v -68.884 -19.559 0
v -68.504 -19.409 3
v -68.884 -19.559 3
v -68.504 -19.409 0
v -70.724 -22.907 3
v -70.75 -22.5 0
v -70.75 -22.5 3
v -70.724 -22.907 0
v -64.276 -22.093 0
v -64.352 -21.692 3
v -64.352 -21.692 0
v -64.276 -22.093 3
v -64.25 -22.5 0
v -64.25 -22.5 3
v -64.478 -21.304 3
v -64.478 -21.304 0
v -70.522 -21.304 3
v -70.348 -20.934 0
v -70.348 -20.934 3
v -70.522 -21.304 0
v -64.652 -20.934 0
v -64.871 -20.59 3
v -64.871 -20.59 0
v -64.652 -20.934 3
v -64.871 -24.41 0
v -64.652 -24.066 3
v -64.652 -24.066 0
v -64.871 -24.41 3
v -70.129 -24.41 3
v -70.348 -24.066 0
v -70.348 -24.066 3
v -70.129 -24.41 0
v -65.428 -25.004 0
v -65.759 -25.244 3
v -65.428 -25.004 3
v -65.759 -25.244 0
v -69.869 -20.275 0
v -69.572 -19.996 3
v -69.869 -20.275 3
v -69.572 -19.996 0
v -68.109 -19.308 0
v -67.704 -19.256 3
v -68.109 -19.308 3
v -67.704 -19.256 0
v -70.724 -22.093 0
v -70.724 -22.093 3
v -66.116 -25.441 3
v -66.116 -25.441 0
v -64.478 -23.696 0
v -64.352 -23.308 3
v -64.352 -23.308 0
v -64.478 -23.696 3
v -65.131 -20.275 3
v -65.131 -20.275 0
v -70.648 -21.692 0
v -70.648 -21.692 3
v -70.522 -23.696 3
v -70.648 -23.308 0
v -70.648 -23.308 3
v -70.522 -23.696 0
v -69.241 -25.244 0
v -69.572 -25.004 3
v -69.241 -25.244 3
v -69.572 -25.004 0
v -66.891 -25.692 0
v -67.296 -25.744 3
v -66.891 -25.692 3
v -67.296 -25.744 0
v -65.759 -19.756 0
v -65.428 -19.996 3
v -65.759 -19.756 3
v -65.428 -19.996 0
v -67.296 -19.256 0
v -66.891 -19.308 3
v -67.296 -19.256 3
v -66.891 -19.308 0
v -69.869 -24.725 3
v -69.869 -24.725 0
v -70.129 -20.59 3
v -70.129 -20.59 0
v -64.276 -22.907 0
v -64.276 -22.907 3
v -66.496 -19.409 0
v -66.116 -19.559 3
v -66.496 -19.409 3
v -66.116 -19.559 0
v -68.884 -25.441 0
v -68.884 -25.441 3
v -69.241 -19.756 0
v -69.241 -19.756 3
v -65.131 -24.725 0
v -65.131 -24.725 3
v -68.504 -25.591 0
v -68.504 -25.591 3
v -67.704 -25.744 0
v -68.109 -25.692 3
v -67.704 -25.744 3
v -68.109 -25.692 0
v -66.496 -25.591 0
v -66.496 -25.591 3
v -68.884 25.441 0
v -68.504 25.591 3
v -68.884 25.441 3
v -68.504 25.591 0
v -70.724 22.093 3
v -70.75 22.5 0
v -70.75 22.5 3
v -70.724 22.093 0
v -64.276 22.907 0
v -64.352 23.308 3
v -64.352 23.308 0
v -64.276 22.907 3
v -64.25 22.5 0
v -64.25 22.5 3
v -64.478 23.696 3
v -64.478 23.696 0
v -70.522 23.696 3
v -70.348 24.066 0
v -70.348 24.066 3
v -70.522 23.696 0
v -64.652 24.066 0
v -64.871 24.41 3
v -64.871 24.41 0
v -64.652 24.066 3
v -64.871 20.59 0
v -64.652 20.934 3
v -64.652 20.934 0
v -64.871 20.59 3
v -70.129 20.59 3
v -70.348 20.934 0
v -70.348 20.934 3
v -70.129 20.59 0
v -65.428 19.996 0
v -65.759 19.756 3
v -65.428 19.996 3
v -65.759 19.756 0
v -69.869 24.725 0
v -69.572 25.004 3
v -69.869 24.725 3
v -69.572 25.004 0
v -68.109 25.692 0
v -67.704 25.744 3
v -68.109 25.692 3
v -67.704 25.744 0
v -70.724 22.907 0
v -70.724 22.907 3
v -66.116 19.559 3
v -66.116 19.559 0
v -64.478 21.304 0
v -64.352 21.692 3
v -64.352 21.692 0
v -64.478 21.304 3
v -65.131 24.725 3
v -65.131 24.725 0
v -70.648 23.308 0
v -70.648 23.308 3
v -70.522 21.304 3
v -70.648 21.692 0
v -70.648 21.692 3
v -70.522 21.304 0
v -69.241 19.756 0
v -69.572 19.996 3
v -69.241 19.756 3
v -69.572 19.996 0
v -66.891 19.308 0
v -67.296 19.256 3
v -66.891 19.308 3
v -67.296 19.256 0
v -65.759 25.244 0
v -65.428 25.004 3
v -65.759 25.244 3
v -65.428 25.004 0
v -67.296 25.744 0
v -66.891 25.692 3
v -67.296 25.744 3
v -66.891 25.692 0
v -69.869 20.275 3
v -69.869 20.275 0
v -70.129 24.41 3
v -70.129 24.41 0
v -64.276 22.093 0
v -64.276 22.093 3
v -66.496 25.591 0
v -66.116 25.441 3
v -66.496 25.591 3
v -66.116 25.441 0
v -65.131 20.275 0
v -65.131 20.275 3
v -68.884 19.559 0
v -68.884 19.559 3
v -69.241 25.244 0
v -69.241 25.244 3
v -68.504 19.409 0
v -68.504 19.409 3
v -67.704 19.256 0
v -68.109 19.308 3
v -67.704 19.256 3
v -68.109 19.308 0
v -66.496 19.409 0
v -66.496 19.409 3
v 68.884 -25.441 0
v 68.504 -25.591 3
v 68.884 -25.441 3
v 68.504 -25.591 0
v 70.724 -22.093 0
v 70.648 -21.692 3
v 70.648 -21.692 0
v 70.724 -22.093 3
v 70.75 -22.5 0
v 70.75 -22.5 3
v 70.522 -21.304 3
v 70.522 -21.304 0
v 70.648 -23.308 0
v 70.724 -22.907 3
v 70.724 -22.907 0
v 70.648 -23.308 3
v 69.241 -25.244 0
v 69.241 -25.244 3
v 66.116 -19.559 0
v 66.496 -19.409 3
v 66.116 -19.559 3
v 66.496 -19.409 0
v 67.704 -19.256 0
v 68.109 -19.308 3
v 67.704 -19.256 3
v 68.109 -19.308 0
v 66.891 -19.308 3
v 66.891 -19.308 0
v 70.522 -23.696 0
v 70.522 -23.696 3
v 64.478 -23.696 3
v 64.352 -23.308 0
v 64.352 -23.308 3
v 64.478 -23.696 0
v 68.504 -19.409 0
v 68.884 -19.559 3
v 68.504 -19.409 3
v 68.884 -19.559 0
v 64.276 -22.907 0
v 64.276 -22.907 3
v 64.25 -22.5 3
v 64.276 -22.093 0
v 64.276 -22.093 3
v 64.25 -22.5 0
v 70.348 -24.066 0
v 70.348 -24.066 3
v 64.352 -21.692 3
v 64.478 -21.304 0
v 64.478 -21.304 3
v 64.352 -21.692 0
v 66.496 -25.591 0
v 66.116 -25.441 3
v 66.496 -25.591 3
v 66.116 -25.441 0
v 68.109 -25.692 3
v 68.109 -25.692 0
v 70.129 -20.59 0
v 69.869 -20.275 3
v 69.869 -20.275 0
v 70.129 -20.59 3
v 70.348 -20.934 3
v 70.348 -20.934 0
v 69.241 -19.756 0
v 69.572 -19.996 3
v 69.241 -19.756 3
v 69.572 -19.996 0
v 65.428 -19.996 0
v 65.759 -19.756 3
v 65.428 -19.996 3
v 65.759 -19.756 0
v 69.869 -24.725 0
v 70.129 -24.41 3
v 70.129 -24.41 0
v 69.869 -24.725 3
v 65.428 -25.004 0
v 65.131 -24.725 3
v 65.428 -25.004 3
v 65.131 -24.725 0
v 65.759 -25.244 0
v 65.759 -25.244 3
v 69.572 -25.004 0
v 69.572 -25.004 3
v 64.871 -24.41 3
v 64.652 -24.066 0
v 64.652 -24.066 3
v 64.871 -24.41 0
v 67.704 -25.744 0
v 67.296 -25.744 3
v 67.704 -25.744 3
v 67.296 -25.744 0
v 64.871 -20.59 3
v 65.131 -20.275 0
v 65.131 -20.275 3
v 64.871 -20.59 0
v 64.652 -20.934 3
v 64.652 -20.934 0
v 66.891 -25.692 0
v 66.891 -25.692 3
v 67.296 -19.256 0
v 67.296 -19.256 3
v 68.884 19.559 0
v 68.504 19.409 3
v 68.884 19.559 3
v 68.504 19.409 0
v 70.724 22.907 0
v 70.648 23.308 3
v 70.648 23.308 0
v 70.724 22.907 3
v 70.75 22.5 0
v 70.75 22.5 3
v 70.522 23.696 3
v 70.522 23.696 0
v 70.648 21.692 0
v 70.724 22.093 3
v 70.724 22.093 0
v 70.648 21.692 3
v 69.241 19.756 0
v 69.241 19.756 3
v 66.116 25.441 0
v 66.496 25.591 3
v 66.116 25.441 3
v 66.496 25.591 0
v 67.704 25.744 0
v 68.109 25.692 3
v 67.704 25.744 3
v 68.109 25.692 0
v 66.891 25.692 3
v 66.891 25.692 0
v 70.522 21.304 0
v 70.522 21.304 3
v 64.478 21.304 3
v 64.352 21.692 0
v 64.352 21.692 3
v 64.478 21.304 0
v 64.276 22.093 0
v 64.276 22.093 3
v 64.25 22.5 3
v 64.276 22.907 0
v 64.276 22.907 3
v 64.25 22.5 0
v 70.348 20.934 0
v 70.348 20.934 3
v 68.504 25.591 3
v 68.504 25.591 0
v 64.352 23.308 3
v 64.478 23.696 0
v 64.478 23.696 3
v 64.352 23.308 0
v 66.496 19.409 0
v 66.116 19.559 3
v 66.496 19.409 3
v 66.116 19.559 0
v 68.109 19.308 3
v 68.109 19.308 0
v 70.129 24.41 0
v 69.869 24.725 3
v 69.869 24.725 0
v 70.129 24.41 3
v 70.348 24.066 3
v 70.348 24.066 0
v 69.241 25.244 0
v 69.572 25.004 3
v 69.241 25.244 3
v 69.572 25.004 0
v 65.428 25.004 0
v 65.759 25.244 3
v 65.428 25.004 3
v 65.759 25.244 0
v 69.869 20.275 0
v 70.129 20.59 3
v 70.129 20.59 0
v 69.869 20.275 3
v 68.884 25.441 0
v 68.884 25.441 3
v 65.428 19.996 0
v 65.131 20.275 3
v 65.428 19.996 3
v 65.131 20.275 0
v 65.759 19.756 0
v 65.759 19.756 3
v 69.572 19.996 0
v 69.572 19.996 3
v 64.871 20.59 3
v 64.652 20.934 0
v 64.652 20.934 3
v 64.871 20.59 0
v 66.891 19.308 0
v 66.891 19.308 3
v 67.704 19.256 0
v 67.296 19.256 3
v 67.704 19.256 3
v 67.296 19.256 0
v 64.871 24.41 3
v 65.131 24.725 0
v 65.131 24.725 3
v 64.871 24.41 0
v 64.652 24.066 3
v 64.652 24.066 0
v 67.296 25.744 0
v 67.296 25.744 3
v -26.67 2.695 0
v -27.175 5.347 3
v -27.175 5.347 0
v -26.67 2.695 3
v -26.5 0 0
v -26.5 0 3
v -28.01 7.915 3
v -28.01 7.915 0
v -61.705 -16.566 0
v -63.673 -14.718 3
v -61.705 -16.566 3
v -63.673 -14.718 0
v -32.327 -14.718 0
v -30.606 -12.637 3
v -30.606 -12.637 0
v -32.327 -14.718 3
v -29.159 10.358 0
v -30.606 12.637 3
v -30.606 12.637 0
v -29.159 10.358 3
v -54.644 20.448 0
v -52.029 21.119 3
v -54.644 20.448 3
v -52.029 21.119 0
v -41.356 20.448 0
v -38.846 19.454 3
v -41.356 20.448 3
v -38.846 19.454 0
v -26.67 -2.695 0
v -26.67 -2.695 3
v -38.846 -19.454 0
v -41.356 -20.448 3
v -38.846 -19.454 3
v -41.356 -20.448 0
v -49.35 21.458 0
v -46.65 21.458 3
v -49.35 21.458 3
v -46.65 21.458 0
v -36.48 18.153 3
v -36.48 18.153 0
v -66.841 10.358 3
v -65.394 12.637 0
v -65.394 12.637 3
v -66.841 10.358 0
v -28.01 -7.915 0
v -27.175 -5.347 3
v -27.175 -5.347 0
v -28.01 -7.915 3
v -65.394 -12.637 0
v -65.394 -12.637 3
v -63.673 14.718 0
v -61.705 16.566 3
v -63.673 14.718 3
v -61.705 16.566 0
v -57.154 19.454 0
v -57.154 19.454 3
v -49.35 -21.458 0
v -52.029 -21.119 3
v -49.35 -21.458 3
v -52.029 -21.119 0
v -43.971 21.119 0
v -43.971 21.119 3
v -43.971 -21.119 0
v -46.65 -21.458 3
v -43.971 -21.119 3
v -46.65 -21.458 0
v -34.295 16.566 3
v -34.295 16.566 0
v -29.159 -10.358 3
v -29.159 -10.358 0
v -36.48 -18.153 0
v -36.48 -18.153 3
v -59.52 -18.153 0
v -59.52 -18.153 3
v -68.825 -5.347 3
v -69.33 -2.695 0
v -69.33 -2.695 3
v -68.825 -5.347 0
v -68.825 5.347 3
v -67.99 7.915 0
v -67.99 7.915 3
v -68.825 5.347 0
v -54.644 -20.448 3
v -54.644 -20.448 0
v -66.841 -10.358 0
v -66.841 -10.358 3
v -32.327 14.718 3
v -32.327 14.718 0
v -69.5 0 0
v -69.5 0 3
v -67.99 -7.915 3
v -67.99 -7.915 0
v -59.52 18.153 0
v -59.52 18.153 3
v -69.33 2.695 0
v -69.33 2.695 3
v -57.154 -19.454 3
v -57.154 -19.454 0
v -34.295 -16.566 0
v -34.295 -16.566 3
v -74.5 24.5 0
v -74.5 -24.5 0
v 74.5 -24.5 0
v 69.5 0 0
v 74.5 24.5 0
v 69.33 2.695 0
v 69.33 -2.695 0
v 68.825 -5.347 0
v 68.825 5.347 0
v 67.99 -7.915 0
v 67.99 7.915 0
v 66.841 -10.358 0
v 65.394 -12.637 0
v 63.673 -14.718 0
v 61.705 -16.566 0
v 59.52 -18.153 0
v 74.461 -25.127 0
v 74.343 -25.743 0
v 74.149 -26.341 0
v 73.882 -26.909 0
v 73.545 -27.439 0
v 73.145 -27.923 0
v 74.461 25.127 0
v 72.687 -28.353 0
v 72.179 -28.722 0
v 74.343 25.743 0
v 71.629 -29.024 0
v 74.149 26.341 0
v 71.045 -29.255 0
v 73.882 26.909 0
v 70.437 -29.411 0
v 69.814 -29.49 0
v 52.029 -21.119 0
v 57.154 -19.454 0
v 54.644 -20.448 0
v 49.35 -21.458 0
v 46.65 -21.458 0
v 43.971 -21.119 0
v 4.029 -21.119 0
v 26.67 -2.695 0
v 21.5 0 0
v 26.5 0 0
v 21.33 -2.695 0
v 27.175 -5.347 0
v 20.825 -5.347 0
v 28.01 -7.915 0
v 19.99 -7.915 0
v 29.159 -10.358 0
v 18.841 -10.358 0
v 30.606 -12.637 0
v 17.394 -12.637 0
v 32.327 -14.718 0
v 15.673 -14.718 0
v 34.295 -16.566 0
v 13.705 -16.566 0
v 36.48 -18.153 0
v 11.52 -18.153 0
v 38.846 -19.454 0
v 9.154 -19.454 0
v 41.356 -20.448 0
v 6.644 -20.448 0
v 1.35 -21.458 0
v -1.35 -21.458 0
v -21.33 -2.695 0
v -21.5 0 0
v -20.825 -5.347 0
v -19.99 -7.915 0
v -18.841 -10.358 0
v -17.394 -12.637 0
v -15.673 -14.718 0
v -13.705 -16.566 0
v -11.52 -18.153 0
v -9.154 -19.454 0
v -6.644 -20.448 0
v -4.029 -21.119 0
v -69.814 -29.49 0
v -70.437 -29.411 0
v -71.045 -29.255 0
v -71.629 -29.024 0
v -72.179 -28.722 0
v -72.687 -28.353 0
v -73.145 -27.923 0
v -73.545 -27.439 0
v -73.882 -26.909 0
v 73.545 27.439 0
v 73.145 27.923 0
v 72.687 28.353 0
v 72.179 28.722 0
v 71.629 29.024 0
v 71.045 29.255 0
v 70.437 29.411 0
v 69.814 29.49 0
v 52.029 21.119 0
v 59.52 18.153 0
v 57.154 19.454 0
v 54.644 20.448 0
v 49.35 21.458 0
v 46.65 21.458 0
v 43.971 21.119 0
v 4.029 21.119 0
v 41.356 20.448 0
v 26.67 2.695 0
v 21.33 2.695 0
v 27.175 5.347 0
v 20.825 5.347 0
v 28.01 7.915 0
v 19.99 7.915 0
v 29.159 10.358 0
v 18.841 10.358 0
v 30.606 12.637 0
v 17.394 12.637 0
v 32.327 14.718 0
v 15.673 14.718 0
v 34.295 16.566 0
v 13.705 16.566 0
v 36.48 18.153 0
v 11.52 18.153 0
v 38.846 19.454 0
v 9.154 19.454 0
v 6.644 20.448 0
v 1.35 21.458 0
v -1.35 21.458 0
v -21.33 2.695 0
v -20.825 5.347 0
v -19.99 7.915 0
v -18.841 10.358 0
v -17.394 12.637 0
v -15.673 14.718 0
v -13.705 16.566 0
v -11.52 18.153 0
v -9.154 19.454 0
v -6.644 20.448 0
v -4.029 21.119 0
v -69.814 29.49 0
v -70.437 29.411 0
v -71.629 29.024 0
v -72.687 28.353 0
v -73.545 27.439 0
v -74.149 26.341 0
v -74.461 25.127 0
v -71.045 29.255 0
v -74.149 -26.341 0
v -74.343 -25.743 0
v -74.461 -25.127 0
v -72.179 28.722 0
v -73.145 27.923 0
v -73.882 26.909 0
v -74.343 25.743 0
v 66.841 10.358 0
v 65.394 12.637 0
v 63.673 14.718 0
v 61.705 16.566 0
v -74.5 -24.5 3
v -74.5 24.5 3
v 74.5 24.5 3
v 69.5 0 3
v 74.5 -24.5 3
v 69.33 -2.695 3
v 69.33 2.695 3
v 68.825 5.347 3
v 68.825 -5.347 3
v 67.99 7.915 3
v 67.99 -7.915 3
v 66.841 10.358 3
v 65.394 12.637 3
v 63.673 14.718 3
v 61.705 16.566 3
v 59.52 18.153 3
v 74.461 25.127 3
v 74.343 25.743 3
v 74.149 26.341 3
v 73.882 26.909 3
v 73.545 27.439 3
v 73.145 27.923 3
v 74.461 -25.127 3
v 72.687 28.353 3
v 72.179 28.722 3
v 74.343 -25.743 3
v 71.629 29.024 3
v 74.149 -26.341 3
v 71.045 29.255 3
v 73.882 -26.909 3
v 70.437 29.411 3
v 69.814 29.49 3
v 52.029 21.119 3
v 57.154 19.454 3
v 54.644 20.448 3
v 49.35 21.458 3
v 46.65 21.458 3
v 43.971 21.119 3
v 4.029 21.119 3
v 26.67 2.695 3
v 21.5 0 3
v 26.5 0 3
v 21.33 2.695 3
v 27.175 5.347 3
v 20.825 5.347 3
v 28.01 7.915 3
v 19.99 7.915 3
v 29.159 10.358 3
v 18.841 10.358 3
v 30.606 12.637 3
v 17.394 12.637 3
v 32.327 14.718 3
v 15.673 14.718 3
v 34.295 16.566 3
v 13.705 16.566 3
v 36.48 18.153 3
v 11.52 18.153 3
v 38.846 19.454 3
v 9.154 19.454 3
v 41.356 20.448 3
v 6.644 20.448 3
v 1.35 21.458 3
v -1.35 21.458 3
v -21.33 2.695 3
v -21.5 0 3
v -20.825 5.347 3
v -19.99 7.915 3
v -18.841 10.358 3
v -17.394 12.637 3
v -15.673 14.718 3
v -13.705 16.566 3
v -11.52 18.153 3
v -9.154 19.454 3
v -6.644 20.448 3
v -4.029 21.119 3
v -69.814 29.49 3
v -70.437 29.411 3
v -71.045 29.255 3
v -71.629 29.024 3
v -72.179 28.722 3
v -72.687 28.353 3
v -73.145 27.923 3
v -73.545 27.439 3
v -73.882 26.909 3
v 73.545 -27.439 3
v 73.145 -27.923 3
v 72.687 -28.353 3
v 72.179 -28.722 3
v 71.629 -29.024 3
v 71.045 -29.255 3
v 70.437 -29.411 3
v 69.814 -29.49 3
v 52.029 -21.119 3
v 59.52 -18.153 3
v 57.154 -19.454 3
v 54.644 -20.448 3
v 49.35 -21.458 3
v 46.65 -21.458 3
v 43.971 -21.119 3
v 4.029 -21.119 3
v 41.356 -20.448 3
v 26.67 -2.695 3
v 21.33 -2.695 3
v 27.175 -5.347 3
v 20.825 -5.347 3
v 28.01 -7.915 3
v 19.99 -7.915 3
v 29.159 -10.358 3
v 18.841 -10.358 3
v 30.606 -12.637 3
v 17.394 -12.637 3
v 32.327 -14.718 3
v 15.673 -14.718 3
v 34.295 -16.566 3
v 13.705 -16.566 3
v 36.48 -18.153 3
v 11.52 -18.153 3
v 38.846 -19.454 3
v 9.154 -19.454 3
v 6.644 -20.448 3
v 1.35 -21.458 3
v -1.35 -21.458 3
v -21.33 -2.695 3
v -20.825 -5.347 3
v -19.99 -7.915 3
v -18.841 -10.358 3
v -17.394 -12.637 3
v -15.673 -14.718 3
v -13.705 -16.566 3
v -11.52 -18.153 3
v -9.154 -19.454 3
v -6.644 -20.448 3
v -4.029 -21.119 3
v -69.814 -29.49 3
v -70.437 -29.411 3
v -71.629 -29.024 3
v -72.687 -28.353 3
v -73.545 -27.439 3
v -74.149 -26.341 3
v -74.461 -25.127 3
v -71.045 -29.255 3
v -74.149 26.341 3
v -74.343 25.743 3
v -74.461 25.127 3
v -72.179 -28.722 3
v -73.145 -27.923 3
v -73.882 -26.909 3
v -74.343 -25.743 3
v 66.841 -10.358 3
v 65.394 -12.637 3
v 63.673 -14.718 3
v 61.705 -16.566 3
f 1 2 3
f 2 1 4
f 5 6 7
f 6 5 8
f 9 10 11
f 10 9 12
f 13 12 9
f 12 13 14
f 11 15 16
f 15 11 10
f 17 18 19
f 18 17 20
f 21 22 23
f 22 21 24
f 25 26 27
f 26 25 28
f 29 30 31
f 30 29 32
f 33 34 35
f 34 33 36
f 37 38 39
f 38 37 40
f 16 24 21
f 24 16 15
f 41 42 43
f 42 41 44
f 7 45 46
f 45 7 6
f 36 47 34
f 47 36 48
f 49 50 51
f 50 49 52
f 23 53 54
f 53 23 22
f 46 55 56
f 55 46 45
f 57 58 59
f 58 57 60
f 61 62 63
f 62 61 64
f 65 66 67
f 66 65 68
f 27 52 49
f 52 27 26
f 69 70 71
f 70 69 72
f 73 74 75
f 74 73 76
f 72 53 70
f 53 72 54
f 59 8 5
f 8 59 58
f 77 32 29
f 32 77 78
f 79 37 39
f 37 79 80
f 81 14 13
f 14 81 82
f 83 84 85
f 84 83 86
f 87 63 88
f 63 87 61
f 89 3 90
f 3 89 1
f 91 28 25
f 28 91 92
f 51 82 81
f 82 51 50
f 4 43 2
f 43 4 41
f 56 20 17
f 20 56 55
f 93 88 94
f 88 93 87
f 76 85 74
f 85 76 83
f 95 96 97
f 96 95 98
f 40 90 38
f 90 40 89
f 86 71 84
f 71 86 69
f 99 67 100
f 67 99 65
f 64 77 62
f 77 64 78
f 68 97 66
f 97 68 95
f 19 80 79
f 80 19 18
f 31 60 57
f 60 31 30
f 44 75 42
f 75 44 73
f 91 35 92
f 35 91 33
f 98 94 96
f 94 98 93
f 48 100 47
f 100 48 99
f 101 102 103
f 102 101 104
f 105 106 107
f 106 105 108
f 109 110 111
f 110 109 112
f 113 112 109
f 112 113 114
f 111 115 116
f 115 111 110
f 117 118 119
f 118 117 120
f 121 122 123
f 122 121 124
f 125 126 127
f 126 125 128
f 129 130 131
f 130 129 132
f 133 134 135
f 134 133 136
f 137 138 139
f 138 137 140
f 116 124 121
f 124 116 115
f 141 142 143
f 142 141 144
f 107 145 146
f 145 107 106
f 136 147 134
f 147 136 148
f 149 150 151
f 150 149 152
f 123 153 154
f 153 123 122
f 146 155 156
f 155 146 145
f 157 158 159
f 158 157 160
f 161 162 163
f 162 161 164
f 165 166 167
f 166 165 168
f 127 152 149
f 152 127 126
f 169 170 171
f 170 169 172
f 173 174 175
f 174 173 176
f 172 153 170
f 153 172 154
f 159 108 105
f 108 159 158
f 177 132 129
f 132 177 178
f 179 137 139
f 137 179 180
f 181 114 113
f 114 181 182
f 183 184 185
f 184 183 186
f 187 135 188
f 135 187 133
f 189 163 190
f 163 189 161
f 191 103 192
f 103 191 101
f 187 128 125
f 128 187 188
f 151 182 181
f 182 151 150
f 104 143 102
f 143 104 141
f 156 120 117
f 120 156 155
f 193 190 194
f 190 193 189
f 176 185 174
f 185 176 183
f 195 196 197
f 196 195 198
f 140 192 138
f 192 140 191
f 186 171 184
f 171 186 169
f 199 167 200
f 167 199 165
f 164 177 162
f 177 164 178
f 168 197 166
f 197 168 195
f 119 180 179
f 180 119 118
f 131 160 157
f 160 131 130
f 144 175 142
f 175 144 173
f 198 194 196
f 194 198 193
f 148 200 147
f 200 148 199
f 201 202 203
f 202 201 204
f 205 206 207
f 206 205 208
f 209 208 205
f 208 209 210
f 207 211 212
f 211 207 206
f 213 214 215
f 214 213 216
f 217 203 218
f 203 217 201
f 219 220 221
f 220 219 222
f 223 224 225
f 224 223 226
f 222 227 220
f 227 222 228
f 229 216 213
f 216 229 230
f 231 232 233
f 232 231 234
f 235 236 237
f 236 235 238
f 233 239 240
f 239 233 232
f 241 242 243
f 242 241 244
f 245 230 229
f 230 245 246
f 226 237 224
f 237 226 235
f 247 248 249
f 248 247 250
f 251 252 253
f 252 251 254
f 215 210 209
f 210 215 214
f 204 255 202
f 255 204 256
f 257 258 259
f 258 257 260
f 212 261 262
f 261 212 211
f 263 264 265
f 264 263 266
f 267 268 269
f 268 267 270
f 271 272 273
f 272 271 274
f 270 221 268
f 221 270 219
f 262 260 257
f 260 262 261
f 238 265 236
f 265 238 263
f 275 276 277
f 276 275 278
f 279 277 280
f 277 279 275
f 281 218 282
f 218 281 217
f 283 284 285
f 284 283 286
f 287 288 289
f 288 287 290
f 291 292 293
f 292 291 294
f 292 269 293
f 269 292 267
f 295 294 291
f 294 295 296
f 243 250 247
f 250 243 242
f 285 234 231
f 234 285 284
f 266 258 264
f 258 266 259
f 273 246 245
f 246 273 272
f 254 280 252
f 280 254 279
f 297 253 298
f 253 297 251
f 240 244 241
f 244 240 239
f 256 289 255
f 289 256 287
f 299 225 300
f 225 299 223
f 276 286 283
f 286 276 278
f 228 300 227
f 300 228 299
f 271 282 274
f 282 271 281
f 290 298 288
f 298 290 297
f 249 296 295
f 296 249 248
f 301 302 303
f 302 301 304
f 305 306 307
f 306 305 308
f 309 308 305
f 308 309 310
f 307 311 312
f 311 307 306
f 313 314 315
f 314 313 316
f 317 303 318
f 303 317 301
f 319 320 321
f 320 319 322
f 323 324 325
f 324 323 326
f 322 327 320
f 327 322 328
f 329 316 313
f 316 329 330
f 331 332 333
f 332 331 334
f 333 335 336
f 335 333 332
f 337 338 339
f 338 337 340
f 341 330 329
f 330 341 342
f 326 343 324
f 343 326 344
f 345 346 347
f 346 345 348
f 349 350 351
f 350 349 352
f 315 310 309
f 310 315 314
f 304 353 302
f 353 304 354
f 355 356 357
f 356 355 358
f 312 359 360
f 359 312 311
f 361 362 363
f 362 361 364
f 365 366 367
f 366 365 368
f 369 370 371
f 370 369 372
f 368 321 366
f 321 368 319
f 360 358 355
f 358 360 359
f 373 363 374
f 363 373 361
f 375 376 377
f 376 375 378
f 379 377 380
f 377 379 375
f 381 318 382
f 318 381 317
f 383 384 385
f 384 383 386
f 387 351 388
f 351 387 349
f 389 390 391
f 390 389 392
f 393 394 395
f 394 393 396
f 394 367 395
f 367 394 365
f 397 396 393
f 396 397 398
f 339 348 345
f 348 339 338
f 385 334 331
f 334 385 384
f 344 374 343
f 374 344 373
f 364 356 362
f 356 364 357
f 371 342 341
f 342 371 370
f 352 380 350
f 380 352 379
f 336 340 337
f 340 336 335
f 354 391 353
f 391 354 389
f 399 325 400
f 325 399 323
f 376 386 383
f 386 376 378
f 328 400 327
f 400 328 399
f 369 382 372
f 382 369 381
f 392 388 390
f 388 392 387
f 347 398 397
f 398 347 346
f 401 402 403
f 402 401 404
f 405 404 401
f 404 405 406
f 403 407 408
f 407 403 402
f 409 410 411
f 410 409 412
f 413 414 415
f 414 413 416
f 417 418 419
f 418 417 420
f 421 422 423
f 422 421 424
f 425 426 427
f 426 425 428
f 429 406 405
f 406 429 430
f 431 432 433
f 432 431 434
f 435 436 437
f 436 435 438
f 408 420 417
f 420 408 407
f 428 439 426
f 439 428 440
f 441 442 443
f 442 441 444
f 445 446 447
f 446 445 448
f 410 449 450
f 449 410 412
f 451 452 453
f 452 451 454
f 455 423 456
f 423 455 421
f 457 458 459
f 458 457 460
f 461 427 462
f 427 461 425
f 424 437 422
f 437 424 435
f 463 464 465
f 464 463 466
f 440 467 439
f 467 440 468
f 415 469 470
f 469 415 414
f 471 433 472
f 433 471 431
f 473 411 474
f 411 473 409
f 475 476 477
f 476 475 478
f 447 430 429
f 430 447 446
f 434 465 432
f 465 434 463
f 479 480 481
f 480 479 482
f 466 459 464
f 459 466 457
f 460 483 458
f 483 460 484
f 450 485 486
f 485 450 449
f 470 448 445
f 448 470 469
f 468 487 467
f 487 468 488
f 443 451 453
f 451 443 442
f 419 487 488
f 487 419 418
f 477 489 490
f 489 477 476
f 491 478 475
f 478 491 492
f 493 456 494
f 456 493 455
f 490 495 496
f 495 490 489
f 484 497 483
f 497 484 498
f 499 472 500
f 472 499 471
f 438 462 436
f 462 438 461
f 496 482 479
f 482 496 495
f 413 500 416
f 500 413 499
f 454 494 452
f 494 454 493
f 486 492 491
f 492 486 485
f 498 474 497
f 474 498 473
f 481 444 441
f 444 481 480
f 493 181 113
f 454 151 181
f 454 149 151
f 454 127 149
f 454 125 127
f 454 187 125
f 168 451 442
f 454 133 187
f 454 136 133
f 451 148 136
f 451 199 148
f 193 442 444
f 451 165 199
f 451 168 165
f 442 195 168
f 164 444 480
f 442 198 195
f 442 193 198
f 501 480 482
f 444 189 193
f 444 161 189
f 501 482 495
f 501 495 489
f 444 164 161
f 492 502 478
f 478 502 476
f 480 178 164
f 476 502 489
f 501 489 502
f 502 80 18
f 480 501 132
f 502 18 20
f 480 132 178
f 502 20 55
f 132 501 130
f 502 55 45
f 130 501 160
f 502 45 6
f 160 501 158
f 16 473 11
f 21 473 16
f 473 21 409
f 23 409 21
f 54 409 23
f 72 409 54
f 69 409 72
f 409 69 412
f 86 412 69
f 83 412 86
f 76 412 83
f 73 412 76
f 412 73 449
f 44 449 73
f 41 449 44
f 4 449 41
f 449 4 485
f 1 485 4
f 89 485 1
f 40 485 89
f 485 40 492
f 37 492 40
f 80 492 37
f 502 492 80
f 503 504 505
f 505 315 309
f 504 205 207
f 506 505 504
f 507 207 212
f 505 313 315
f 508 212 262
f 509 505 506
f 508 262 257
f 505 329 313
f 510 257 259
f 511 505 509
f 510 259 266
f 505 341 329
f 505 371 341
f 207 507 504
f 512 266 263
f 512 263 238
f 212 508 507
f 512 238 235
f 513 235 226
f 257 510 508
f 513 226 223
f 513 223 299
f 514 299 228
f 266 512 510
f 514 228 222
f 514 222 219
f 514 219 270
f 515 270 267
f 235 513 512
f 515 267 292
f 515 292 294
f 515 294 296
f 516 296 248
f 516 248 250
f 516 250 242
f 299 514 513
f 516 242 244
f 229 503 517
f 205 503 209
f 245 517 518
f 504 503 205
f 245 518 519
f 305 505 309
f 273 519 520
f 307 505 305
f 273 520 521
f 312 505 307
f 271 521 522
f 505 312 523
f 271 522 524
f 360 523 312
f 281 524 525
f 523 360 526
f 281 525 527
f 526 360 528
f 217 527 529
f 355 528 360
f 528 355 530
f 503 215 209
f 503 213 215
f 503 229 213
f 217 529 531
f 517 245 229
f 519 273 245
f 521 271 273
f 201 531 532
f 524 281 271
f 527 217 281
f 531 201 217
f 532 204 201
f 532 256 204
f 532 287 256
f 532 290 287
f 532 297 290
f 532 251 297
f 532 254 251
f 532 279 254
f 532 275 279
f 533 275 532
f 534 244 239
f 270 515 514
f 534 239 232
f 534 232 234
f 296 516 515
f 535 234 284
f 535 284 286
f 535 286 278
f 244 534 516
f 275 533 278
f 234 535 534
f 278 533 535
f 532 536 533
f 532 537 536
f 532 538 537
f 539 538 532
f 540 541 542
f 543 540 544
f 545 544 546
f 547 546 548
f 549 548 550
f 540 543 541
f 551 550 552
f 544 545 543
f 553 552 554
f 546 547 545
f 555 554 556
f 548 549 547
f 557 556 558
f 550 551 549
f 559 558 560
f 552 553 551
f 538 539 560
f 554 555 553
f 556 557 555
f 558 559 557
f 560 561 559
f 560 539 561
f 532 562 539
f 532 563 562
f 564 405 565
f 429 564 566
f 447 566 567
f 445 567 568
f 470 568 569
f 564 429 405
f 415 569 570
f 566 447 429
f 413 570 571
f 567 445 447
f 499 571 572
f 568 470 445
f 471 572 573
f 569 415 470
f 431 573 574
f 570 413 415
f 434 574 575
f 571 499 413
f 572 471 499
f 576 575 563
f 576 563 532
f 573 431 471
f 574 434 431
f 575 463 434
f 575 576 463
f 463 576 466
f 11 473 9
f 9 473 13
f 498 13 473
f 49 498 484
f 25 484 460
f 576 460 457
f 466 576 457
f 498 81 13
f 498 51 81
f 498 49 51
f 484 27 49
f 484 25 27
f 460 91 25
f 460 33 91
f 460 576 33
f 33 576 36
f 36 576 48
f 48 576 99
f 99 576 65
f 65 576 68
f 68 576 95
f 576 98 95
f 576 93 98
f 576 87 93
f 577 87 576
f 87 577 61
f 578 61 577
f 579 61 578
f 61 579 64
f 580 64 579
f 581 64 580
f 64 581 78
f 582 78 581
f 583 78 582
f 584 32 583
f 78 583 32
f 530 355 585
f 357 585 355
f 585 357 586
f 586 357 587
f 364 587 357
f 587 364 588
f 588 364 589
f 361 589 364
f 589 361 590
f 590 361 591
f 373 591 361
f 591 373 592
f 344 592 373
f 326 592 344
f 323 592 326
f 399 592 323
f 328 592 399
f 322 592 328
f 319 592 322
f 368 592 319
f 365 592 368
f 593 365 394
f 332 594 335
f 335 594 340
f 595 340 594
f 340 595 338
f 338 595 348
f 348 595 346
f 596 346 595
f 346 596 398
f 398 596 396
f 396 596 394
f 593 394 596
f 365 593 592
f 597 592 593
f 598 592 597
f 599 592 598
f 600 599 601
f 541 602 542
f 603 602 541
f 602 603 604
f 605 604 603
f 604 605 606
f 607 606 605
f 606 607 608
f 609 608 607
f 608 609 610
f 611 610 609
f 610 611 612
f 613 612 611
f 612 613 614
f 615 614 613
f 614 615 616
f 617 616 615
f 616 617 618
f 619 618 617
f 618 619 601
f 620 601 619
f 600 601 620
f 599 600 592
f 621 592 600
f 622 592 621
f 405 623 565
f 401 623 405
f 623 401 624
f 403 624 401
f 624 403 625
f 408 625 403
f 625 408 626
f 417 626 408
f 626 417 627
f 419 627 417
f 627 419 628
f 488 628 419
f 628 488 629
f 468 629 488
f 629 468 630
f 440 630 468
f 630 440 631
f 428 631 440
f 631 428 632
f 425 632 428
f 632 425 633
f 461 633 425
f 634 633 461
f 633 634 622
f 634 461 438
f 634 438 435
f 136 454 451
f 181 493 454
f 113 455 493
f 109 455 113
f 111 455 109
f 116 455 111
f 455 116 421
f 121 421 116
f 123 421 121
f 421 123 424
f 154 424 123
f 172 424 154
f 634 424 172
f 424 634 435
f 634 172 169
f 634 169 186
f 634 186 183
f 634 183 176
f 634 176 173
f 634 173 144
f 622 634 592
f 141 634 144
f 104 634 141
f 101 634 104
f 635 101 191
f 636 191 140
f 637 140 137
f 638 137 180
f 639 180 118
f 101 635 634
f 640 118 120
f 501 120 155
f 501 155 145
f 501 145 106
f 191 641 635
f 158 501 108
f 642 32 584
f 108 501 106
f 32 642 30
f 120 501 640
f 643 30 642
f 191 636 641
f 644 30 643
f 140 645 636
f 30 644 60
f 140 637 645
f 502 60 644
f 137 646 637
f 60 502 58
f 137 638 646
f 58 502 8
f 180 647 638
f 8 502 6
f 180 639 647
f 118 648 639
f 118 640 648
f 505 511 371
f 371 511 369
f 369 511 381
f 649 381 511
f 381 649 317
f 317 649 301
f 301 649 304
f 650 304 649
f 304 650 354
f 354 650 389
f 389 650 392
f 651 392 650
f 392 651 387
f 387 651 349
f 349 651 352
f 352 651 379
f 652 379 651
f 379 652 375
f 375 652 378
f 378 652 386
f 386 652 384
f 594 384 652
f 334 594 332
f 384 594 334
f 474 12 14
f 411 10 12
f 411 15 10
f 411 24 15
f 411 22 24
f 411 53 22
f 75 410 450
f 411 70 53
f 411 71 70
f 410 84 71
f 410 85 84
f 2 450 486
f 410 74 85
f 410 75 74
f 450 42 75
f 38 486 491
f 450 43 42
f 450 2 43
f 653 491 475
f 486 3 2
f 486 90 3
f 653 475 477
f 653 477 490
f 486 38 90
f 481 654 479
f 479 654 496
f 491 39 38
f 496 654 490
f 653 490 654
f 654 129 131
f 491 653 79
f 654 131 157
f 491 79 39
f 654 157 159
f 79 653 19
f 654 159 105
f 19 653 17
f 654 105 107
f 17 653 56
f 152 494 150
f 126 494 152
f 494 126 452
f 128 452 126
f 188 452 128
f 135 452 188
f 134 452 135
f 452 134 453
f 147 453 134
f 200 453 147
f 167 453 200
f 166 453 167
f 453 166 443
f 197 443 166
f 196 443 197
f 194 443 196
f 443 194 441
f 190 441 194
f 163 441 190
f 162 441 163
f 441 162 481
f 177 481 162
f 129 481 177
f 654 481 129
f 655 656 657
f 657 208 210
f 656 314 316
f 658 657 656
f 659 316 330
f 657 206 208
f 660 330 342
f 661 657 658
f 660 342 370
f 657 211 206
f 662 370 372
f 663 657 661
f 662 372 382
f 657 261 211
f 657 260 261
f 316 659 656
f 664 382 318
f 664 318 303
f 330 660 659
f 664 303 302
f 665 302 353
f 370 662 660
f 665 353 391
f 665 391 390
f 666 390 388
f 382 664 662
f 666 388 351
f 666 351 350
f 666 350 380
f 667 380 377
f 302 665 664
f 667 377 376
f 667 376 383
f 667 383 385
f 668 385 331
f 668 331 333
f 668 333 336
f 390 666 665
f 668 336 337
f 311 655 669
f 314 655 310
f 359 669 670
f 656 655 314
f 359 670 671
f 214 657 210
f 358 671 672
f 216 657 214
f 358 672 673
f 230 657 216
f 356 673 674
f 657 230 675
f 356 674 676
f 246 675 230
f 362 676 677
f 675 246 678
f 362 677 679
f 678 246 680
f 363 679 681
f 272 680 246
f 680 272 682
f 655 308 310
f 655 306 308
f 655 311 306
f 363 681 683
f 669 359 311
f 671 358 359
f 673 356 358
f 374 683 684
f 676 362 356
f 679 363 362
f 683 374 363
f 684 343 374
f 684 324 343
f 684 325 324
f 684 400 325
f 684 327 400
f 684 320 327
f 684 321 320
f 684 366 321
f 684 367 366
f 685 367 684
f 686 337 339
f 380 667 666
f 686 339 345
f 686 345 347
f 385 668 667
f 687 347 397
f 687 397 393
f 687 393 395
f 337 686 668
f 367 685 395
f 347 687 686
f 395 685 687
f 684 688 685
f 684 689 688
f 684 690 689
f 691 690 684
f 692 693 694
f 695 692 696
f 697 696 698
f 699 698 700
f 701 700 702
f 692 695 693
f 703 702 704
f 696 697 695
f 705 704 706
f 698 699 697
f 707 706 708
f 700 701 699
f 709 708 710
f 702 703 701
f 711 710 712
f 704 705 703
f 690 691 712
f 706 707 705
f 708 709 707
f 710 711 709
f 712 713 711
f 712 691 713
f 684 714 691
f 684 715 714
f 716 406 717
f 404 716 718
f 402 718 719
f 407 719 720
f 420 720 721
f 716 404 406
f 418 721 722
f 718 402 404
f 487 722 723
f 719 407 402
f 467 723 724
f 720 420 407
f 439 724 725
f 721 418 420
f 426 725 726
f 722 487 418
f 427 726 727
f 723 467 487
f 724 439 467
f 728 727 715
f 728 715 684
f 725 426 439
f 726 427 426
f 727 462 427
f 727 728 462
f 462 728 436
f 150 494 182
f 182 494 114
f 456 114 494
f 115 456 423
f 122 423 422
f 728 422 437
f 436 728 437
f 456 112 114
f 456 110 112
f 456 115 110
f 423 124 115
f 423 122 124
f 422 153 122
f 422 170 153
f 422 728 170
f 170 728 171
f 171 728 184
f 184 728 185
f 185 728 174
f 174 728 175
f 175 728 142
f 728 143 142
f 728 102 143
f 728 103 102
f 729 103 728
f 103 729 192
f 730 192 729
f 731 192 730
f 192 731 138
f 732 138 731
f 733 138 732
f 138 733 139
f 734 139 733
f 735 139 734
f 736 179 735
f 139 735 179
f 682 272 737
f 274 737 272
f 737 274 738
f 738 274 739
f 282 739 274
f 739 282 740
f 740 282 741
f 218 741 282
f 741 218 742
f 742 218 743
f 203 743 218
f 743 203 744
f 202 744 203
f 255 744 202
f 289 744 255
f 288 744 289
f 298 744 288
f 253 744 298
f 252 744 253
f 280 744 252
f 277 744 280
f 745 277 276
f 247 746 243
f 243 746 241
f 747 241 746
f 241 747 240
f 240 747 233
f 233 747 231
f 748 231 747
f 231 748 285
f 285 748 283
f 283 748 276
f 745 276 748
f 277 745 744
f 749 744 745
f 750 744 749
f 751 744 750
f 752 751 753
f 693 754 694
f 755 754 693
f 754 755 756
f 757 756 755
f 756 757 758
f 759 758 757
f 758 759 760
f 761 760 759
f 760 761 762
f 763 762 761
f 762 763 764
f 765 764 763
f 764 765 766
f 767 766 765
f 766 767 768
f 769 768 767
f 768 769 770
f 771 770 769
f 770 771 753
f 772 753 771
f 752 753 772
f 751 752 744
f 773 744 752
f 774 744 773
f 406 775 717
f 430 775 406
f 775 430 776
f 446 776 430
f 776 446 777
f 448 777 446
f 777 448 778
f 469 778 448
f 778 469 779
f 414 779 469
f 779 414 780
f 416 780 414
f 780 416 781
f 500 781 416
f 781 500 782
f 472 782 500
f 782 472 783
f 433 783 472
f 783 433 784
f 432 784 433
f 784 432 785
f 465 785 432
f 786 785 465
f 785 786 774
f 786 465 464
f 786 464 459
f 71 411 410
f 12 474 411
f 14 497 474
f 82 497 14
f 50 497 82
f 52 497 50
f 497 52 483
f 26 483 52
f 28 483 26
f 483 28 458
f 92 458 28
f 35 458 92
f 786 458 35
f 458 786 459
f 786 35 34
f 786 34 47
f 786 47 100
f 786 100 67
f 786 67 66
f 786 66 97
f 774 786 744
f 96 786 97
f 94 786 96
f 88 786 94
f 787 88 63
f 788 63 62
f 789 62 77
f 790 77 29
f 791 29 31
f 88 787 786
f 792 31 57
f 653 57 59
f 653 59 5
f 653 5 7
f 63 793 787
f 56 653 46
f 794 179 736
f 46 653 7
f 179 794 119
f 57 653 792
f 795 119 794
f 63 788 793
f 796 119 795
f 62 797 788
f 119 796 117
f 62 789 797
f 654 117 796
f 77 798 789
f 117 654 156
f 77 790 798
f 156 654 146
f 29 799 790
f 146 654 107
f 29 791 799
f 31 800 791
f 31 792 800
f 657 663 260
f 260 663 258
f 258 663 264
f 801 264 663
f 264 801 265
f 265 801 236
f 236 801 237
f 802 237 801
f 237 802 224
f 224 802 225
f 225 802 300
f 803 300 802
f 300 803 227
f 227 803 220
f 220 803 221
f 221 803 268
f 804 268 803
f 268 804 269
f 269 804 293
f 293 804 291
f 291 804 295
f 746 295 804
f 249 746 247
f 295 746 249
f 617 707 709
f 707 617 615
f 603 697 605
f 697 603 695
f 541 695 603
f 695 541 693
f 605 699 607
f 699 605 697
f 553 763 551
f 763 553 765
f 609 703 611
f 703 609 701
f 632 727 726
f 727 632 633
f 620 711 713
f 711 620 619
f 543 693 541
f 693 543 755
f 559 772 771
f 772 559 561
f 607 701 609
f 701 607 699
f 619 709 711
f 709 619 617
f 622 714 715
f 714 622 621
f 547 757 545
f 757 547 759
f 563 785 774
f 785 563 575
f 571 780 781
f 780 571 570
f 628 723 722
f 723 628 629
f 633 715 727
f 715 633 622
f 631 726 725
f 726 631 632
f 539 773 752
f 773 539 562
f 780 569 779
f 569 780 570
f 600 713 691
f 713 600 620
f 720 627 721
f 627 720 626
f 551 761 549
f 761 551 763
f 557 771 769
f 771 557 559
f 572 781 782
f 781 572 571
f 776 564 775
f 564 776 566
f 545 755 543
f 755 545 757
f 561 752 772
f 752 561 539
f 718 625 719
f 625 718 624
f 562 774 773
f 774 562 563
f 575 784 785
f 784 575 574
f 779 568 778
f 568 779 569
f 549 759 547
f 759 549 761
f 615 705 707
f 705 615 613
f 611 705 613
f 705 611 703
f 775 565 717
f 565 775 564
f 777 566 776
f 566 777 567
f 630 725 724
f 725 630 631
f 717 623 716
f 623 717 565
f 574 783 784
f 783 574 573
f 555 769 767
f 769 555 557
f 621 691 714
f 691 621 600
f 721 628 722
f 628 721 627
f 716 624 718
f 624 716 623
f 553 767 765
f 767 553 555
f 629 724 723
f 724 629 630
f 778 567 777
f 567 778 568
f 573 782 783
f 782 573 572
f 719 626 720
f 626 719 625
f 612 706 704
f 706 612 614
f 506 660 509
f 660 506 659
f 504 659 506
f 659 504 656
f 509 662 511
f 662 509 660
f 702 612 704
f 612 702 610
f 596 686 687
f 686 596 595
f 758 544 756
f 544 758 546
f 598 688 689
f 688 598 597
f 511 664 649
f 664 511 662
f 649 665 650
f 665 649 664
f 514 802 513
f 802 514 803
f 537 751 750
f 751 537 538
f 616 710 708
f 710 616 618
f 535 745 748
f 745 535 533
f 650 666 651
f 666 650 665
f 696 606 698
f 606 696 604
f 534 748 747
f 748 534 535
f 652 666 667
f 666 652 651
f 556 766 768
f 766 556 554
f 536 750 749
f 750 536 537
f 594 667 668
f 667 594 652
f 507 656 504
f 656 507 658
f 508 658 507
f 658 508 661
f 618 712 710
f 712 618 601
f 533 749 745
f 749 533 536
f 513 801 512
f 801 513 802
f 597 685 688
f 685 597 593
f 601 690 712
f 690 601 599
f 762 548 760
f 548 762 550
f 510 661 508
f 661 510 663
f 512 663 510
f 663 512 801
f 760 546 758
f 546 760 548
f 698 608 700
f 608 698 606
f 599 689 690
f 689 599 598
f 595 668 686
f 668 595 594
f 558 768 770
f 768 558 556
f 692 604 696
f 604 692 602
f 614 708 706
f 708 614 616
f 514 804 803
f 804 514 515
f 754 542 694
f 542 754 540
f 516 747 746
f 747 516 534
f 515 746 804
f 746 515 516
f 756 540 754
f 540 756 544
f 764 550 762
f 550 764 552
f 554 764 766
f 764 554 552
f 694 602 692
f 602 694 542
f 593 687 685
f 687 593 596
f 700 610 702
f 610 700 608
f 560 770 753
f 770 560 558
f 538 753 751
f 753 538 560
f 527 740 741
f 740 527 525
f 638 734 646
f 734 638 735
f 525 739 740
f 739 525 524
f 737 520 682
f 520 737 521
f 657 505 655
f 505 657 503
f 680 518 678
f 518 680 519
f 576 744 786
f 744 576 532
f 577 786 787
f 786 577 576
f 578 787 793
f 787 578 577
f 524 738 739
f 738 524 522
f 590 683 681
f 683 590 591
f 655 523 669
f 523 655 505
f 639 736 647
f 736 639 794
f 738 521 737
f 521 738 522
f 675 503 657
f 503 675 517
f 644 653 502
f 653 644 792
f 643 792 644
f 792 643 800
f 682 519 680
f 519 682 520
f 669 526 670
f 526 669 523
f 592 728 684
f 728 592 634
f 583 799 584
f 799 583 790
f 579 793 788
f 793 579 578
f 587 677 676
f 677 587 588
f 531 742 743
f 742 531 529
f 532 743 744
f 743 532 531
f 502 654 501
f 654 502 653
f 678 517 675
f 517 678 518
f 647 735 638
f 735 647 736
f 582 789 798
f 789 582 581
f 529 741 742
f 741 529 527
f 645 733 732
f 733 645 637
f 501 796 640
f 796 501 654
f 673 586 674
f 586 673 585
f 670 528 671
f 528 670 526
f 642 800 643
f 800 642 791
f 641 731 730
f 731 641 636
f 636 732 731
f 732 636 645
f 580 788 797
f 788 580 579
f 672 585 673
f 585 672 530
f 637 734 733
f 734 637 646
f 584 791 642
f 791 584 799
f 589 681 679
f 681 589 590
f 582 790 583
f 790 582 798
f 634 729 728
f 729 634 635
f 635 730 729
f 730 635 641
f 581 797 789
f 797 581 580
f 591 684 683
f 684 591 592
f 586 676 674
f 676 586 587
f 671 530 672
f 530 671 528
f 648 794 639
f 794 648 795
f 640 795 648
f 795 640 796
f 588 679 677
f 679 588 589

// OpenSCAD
$fn = 50;


difference() {
	union() {
		hull() {
			translate(v = [-69.5000000000, 24.5000000000, 0]) {
				cylinder(h = 3, r = 5);
			}
			translate(v = [69.5000000000, 24.5000000000, 0]) {
				cylinder(h = 3, r = 5);
			}
			translate(v = [-69.5000000000, -24.5000000000, 0]) {
				cylinder(h = 3, r = 5);
			}
			translate(v = [69.5000000000, -24.5000000000, 0]) {
				cylinder(h = 3, r = 5);
			}
		}
	}
	union() {
		#translate(v = [-67.5000000000, -22.5000000000, -100.0000000000]) {
			cylinder(h = 200, r = 3.2500000000);
		}
		#translate(v = [-67.5000000000, 22.5000000000, -100.0000000000]) {
			cylinder(h = 200, r = 3.2500000000);
		}
		#translate(v = [67.5000000000, -22.5000000000, -100.0000000000]) {
			cylinder(h = 200, r = 3.2500000000);
		}
		#translate(v = [67.5000000000, 22.5000000000, -100.0000000000]) {
			cylinder(h = 200, r = 3.2500000000);
		}
		#translate(v = [-48.0000000000, 0, 0]) {
			cylinder(h = 3, r = 21.5000000000);
		}
		#cylinder(h = 3, r = 21.5000000000);
		#translate(v = [48.0000000000, 0, 0]) {
			cylinder(h = 3, r = 21.5000000000);
		}
	}
}
